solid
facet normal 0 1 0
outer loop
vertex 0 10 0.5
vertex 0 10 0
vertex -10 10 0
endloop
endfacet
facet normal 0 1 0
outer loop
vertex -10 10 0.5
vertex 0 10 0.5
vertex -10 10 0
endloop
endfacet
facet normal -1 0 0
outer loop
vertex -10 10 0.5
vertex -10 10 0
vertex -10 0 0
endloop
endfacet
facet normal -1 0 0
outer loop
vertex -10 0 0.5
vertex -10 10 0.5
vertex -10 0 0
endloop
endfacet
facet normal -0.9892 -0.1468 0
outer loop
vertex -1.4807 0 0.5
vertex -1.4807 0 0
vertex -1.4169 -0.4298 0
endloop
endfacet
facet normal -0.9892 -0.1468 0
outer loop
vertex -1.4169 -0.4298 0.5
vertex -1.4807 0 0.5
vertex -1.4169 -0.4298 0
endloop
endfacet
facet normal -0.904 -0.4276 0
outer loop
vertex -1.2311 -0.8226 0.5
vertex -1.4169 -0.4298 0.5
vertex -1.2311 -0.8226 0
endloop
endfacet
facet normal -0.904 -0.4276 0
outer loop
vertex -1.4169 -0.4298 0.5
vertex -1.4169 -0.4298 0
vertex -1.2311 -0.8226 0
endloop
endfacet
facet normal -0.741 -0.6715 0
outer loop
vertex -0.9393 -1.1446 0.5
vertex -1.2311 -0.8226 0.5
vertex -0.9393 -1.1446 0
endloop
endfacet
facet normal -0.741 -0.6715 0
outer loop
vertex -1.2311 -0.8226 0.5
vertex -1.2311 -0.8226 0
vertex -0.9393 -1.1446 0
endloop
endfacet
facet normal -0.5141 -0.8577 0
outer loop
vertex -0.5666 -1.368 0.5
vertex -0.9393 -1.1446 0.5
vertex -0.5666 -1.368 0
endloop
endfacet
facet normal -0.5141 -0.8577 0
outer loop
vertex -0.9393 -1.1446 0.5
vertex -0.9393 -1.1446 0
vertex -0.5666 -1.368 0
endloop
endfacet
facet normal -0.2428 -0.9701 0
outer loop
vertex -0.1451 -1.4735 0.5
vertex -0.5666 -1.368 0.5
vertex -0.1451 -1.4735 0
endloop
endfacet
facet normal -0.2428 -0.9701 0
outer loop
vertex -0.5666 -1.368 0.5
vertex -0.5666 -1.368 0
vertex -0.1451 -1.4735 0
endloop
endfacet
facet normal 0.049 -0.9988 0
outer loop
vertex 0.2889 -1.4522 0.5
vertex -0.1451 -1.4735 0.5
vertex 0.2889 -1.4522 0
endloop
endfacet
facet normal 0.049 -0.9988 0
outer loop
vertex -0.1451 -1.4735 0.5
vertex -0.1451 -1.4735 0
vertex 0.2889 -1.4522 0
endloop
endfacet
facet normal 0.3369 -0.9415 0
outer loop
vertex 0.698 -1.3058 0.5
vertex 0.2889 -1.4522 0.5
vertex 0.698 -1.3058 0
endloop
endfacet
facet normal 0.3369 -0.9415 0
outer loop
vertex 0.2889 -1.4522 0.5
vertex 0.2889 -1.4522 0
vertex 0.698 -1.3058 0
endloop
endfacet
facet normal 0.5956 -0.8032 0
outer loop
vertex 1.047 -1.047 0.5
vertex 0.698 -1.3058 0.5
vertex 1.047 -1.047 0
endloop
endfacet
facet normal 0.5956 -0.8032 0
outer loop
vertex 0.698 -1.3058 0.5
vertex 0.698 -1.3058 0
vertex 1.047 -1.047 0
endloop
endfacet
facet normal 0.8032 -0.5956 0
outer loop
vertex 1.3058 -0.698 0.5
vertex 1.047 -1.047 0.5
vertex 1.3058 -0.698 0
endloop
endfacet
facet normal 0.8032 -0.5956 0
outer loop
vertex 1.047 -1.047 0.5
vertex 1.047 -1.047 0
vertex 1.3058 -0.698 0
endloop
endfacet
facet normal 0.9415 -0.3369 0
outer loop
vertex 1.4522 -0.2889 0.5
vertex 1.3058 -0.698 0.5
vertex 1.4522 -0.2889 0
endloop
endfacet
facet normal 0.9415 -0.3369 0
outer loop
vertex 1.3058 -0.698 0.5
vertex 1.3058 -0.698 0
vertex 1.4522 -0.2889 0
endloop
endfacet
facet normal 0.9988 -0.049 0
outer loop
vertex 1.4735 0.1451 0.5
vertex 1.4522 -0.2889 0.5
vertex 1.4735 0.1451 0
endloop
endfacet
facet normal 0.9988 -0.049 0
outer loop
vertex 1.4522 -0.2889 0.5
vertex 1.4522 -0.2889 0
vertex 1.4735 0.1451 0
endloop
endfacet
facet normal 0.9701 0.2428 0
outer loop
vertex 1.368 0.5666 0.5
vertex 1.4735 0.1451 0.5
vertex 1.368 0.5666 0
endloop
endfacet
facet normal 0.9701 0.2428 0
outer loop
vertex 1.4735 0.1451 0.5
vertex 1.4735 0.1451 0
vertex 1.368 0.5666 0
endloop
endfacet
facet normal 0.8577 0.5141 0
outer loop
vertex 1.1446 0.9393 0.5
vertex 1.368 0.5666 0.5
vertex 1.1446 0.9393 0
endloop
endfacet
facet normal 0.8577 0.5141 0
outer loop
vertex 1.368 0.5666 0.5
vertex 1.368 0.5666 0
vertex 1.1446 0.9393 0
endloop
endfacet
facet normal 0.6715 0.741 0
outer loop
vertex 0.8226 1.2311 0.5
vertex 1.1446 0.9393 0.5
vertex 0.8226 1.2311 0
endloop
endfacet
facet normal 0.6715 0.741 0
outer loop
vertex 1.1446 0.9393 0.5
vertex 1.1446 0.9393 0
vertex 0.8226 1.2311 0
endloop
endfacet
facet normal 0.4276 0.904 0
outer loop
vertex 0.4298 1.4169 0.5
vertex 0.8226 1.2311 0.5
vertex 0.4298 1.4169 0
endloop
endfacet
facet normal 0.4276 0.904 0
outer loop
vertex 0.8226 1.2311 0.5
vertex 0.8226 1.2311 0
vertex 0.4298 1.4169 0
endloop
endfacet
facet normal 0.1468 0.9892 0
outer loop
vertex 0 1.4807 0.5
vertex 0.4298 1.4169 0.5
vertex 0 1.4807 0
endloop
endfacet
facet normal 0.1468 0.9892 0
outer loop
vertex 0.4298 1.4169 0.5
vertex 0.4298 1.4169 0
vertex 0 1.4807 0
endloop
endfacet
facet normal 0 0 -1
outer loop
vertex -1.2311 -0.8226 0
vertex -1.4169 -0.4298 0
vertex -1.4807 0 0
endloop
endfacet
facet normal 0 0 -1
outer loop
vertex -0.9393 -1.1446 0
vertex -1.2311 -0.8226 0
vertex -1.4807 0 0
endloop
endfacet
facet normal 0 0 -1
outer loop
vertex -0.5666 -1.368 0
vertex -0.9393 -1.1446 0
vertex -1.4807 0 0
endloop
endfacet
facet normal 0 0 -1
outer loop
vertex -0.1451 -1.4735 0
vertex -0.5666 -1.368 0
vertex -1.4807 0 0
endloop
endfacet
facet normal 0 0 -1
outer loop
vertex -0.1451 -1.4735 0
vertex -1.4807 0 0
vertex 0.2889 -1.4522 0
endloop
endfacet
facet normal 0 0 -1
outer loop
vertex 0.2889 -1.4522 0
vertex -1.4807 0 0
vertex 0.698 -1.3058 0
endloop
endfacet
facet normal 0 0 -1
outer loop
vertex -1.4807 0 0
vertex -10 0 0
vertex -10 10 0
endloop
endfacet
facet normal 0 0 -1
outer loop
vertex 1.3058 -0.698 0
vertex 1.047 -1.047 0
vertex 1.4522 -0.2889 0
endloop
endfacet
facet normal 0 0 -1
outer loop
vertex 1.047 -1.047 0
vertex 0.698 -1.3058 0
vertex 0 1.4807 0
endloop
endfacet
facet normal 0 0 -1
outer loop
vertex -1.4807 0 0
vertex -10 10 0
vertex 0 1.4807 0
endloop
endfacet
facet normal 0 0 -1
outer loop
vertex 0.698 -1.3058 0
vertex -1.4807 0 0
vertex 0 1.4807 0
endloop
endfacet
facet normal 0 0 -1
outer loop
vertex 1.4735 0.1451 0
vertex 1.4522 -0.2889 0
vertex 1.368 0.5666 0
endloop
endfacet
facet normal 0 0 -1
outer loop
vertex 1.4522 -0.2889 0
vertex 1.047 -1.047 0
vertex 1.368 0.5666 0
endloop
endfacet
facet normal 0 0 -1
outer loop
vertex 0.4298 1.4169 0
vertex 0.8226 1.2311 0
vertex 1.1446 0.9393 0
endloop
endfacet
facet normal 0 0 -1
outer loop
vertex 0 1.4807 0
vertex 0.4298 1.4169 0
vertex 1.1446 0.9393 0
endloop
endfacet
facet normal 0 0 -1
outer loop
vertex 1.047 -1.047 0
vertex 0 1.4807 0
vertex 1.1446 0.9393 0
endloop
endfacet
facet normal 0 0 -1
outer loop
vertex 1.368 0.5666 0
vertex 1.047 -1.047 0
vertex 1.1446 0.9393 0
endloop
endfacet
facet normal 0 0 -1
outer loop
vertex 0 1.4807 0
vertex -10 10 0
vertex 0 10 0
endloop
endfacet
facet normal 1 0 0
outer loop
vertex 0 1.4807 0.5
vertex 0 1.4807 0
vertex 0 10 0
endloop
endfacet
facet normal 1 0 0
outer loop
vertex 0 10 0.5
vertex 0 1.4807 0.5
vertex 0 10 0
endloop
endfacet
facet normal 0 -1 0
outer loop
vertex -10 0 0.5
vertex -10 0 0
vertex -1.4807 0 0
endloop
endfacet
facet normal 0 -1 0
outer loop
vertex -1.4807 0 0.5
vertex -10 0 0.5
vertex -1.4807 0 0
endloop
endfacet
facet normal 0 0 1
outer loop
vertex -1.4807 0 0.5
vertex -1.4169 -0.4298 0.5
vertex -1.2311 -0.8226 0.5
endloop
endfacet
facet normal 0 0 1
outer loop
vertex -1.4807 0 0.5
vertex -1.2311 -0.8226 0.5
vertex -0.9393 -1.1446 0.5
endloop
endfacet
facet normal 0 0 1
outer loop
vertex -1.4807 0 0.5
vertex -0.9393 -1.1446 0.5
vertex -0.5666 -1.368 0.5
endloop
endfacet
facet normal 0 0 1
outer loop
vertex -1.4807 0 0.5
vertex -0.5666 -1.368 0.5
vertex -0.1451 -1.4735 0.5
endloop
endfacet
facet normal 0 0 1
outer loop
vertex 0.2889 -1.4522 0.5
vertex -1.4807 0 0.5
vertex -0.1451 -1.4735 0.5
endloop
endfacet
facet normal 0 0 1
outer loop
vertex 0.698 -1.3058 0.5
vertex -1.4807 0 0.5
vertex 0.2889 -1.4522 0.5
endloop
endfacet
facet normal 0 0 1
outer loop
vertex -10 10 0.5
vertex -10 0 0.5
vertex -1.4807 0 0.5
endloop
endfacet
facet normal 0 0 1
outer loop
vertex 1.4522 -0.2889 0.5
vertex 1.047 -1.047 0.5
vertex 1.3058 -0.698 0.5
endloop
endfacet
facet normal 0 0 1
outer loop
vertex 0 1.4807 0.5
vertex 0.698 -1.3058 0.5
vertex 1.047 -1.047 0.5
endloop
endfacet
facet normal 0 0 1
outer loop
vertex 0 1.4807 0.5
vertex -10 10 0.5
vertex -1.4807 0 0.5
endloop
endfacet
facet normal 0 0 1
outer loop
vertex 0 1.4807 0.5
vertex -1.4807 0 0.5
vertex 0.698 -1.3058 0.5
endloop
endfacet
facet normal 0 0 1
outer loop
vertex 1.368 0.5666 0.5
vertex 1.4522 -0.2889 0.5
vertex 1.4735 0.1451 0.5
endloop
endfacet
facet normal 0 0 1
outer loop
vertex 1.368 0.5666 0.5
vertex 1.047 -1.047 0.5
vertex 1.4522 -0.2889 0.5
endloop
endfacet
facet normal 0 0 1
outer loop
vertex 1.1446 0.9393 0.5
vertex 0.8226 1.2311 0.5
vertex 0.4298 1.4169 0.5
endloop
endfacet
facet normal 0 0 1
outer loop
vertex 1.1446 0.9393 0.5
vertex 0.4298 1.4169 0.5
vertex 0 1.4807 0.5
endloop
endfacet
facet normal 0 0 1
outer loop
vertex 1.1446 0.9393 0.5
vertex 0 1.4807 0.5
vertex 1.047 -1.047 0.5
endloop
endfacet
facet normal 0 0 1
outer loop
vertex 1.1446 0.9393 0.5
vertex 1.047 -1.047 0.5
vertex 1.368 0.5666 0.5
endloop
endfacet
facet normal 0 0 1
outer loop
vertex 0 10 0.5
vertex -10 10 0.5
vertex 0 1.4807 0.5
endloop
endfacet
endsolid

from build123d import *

# Parameters (mm, degrees)
F1_DEPTH = 0.5


with BuildPart() as f1:
    # F0 (on Top) → F1 (new body)
    with BuildSketch(Plane.XY):
        Polygon((0, 10), (-10, 10), (-10, 0), (-1.480661, 0), (0, 0), (0, 1.480661), align=None)
        with BuildLine():
            ThreePointArc((-1.480661, 0), (1.046985, -1.046985), (0, 1.480661))
            Line((0, 1.480661), (0, 0))
            Line((0, 0), (-1.480661, 0))
        make_face()
    extrude(amount=F1_DEPTH)


solid = f1.part
